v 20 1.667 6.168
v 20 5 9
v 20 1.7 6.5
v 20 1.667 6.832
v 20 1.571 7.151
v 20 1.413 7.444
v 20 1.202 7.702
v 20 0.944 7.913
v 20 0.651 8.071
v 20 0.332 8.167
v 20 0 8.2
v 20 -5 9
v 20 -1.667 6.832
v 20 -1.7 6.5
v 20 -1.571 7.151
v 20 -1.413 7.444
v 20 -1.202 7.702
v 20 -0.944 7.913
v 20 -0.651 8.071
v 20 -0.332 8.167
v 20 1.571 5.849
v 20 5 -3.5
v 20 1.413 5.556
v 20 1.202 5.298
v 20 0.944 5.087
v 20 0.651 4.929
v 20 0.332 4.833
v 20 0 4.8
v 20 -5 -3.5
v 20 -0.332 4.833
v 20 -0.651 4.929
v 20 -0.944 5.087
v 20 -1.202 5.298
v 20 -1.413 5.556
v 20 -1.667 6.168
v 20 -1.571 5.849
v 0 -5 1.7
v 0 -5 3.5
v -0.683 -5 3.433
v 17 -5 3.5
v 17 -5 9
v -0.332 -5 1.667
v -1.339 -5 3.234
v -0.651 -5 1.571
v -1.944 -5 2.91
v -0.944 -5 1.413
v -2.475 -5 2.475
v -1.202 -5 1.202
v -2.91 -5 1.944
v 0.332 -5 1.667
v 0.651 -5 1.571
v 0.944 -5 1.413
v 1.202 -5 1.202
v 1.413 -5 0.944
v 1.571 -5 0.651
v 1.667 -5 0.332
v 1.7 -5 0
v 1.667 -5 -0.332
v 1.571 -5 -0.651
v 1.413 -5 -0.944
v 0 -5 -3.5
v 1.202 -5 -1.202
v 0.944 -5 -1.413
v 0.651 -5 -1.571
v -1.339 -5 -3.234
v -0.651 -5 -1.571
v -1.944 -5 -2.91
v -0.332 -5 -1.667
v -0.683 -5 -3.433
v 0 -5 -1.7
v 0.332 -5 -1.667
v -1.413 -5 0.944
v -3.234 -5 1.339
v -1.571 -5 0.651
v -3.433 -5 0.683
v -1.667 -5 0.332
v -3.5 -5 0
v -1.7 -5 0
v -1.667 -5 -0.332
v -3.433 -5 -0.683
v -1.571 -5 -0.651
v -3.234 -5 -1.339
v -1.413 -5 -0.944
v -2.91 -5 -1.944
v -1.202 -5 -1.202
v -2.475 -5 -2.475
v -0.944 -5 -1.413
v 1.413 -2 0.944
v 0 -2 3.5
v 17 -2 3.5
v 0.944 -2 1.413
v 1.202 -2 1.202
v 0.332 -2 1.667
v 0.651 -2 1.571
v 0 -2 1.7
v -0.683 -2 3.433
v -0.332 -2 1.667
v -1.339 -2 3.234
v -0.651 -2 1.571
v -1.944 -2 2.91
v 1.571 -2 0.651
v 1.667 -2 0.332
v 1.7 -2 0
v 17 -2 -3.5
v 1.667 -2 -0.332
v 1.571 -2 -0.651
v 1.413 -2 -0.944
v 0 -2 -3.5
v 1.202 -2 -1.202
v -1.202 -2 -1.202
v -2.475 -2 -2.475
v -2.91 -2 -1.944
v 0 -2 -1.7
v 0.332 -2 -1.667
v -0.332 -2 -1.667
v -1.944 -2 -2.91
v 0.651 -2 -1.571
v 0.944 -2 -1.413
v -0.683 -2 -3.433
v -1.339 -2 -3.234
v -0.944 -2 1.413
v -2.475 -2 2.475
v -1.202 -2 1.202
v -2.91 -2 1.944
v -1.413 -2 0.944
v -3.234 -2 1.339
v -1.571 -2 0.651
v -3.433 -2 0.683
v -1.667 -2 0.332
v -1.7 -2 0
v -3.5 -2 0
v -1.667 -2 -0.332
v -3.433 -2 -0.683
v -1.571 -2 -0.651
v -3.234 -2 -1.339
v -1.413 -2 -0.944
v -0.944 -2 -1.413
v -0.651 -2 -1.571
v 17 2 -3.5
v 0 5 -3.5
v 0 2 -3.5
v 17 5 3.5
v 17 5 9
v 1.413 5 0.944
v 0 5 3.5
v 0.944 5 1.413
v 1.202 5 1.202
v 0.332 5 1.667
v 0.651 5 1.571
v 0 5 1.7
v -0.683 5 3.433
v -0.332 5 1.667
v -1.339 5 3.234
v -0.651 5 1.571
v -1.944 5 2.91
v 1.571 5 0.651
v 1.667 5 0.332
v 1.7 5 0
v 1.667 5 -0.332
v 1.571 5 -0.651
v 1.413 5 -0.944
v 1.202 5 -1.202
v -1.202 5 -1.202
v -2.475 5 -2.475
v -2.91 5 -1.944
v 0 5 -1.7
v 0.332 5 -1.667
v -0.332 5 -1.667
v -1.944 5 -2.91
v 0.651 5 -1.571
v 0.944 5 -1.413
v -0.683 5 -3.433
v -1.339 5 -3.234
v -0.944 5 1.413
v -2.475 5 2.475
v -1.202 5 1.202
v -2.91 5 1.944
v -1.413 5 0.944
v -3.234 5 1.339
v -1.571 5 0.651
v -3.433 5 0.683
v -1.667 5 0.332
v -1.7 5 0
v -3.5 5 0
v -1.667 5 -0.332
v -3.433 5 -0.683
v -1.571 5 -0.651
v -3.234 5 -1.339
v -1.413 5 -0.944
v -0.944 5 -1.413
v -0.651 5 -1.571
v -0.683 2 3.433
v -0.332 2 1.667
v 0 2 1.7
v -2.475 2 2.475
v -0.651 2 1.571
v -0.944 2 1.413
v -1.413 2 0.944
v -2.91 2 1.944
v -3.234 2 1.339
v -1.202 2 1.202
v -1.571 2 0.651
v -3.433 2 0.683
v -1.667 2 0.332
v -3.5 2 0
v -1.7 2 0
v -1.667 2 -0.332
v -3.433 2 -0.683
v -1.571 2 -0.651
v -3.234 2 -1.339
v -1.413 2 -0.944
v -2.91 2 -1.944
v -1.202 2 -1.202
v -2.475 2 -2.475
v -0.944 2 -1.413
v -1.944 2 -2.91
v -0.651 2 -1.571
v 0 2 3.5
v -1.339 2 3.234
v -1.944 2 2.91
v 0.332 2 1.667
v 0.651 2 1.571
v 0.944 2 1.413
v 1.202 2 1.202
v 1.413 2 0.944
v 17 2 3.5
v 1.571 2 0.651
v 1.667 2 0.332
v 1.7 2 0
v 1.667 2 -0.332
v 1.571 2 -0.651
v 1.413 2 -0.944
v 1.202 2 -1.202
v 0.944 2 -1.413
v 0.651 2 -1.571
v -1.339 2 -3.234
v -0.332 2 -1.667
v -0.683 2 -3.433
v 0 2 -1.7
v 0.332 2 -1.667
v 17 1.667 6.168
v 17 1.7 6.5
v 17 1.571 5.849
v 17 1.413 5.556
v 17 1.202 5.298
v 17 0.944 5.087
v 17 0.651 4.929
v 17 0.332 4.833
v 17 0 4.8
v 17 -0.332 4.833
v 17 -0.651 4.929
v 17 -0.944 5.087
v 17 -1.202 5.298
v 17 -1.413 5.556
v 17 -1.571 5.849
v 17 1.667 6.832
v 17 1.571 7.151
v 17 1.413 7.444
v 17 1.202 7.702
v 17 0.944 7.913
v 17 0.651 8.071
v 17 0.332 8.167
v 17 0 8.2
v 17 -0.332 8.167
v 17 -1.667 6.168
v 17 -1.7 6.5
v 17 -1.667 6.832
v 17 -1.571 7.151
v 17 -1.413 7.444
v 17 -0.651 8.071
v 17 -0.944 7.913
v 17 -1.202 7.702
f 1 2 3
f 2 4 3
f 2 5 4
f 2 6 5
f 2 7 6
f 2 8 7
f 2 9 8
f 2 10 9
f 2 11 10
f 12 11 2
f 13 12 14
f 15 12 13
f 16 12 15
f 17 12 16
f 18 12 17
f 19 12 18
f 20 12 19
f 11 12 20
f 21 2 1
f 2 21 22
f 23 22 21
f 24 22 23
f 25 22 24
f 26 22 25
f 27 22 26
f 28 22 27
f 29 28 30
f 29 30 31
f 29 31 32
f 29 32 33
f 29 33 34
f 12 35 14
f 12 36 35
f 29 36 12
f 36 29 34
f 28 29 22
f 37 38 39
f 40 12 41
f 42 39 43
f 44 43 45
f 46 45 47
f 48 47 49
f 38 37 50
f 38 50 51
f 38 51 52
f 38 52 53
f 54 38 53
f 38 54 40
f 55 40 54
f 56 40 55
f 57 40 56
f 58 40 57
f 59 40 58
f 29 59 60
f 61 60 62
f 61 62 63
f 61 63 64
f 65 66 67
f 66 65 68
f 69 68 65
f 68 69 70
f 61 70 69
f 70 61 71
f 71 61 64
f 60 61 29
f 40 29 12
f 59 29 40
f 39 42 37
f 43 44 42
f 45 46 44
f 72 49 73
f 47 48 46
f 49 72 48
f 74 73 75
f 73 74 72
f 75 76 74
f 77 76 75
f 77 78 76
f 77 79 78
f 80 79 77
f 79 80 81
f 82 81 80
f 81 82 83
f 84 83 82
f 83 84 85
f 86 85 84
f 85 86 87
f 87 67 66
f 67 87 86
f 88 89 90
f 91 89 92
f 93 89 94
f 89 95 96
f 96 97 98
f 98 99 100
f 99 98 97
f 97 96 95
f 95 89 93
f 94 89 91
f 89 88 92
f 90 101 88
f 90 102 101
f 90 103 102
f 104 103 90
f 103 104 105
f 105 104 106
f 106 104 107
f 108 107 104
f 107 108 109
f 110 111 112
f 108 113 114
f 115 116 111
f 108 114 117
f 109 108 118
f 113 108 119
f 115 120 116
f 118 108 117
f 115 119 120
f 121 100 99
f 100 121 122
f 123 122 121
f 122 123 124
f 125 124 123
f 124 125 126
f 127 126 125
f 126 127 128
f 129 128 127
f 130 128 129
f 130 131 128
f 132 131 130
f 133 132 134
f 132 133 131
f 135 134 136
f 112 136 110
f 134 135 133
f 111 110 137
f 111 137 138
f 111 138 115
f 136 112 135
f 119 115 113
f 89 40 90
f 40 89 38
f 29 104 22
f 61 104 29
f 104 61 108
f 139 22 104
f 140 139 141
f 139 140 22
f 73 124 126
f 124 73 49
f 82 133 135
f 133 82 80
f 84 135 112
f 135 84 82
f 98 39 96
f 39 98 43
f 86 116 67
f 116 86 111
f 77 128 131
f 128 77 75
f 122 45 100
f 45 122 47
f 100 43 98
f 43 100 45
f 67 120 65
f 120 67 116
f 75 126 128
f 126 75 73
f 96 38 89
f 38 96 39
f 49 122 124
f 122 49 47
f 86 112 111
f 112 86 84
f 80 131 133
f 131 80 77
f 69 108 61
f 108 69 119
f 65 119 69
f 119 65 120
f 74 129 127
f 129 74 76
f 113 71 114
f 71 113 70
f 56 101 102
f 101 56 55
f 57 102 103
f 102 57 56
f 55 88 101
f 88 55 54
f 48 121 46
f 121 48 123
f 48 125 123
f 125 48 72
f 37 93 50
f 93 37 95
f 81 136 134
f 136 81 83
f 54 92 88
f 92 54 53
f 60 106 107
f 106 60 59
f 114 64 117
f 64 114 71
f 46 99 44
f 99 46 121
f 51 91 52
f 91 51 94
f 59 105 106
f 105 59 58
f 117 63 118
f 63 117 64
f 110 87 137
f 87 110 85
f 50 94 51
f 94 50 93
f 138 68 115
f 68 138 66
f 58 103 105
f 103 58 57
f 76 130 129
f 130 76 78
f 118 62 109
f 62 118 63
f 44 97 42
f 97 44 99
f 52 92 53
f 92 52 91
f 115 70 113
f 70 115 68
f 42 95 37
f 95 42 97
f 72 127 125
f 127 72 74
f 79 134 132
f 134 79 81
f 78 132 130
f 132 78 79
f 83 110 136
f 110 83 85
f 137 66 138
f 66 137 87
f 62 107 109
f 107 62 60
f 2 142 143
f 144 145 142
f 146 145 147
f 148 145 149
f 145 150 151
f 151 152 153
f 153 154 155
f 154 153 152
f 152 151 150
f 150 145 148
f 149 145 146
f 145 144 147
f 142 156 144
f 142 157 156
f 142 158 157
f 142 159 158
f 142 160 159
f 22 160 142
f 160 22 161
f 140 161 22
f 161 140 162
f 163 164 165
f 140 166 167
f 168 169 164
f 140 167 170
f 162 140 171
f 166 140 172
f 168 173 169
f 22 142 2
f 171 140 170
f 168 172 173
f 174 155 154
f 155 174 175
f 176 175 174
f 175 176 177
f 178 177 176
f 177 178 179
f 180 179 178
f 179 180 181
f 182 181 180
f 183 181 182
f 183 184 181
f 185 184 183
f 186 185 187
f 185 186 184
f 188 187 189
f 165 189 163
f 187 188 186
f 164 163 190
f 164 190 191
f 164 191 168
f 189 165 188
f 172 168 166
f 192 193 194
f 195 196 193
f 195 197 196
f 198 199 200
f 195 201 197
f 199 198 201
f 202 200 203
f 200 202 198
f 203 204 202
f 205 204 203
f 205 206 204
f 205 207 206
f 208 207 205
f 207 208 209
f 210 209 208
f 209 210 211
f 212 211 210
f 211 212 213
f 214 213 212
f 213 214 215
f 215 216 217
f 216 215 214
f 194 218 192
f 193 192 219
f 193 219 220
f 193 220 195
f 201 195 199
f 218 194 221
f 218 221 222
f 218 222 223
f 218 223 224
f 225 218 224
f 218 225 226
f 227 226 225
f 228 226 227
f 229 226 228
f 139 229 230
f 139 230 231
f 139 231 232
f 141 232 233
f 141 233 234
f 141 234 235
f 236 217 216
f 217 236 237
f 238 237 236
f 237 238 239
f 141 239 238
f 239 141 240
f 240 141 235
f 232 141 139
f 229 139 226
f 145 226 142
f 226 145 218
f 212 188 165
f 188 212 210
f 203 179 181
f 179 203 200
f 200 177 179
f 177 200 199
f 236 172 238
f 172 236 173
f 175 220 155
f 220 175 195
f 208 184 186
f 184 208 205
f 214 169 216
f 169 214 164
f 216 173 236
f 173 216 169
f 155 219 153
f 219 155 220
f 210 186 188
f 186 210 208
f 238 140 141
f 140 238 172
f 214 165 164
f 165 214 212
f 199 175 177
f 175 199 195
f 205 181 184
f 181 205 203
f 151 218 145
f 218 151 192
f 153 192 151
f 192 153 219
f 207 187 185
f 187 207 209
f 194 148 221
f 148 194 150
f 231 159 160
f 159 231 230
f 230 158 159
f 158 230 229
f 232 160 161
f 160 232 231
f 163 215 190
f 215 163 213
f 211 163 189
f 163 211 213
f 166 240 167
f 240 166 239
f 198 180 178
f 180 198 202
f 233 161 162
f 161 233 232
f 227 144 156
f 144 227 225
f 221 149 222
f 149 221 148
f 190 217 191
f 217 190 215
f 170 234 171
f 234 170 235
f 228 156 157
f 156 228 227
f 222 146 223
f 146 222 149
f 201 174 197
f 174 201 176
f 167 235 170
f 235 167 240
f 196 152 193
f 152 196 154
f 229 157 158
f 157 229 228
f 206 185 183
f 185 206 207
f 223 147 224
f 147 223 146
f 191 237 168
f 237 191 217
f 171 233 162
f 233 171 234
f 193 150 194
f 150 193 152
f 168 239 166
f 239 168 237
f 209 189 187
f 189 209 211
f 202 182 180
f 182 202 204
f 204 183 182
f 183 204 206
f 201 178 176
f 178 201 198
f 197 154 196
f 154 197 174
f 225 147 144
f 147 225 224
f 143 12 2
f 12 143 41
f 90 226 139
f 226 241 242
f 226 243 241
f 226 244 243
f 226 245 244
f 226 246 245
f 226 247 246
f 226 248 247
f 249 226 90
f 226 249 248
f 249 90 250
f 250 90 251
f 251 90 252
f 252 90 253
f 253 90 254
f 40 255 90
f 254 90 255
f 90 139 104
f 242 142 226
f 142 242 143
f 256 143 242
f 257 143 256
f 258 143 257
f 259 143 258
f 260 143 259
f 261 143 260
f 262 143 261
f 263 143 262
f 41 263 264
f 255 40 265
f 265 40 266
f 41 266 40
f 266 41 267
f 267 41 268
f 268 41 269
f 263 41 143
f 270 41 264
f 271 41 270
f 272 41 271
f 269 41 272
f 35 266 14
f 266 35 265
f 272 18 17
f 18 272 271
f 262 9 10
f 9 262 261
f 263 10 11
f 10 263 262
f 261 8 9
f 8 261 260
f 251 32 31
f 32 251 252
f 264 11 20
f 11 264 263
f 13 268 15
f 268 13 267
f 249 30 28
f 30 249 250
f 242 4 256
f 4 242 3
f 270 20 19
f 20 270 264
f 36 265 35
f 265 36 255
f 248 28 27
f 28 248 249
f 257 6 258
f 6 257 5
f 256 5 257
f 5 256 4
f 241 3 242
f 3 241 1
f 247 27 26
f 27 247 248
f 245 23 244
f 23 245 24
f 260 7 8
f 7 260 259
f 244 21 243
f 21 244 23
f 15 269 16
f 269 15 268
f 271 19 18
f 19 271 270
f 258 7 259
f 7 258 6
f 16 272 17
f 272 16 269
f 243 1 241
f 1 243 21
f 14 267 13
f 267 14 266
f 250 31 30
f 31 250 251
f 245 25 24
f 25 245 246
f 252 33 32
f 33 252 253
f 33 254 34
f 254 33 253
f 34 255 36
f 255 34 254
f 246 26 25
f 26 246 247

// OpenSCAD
//-- arm1.scad by AndrewBCN - November 2014
//-- remix of thing #154834
//-- replaces Brazo.stl with slightly stronger part
//-- and with source file.
//-- GPL V3


arm_th=3;
arm_len=20;
arm_wi=7;
arm_gap=3;
$fn=32;


hole_height = arm_wi + 3;
bracket_length = hole_height + 2.5;
bracket_width = 5;


module arm(){
  difference() {
    // arm
    union() {
      //arm
      translate([arm_len/2,0,arm_th/2]) cube([arm_len,arm_wi,arm_th], center=true);
      //hole
      translate([0,0,arm_th/2]) cylinder(r=arm_wi/2, h=arm_th, center=true);
    }
    // holes
    cylinder(r=3.4/2, h=3*arm_th, center=true);
    //translate([arm_len,0,0]) cylinder(r=3.4/2, h=3*arm_th, center=true);
  }
}

module bracket(){
  difference(){
    cube([bracket_length,10,3]);
    translate([hole_height,5,0]) cylinder(r=3.4/2, h=3*arm_th, center=true);
  }
}

union(){
  translate([0,-2,0]){
    rotate([90,0,0]) arm();
  }

  translate([0,2,0]){
    rotate([270,0,0]) arm();
  }

  translate([arm_len,bracket_width * -1,arm_wi / -2]) {
    rotate([0,270,0]){
      bracket();
    }
  }
}

//bracket();
